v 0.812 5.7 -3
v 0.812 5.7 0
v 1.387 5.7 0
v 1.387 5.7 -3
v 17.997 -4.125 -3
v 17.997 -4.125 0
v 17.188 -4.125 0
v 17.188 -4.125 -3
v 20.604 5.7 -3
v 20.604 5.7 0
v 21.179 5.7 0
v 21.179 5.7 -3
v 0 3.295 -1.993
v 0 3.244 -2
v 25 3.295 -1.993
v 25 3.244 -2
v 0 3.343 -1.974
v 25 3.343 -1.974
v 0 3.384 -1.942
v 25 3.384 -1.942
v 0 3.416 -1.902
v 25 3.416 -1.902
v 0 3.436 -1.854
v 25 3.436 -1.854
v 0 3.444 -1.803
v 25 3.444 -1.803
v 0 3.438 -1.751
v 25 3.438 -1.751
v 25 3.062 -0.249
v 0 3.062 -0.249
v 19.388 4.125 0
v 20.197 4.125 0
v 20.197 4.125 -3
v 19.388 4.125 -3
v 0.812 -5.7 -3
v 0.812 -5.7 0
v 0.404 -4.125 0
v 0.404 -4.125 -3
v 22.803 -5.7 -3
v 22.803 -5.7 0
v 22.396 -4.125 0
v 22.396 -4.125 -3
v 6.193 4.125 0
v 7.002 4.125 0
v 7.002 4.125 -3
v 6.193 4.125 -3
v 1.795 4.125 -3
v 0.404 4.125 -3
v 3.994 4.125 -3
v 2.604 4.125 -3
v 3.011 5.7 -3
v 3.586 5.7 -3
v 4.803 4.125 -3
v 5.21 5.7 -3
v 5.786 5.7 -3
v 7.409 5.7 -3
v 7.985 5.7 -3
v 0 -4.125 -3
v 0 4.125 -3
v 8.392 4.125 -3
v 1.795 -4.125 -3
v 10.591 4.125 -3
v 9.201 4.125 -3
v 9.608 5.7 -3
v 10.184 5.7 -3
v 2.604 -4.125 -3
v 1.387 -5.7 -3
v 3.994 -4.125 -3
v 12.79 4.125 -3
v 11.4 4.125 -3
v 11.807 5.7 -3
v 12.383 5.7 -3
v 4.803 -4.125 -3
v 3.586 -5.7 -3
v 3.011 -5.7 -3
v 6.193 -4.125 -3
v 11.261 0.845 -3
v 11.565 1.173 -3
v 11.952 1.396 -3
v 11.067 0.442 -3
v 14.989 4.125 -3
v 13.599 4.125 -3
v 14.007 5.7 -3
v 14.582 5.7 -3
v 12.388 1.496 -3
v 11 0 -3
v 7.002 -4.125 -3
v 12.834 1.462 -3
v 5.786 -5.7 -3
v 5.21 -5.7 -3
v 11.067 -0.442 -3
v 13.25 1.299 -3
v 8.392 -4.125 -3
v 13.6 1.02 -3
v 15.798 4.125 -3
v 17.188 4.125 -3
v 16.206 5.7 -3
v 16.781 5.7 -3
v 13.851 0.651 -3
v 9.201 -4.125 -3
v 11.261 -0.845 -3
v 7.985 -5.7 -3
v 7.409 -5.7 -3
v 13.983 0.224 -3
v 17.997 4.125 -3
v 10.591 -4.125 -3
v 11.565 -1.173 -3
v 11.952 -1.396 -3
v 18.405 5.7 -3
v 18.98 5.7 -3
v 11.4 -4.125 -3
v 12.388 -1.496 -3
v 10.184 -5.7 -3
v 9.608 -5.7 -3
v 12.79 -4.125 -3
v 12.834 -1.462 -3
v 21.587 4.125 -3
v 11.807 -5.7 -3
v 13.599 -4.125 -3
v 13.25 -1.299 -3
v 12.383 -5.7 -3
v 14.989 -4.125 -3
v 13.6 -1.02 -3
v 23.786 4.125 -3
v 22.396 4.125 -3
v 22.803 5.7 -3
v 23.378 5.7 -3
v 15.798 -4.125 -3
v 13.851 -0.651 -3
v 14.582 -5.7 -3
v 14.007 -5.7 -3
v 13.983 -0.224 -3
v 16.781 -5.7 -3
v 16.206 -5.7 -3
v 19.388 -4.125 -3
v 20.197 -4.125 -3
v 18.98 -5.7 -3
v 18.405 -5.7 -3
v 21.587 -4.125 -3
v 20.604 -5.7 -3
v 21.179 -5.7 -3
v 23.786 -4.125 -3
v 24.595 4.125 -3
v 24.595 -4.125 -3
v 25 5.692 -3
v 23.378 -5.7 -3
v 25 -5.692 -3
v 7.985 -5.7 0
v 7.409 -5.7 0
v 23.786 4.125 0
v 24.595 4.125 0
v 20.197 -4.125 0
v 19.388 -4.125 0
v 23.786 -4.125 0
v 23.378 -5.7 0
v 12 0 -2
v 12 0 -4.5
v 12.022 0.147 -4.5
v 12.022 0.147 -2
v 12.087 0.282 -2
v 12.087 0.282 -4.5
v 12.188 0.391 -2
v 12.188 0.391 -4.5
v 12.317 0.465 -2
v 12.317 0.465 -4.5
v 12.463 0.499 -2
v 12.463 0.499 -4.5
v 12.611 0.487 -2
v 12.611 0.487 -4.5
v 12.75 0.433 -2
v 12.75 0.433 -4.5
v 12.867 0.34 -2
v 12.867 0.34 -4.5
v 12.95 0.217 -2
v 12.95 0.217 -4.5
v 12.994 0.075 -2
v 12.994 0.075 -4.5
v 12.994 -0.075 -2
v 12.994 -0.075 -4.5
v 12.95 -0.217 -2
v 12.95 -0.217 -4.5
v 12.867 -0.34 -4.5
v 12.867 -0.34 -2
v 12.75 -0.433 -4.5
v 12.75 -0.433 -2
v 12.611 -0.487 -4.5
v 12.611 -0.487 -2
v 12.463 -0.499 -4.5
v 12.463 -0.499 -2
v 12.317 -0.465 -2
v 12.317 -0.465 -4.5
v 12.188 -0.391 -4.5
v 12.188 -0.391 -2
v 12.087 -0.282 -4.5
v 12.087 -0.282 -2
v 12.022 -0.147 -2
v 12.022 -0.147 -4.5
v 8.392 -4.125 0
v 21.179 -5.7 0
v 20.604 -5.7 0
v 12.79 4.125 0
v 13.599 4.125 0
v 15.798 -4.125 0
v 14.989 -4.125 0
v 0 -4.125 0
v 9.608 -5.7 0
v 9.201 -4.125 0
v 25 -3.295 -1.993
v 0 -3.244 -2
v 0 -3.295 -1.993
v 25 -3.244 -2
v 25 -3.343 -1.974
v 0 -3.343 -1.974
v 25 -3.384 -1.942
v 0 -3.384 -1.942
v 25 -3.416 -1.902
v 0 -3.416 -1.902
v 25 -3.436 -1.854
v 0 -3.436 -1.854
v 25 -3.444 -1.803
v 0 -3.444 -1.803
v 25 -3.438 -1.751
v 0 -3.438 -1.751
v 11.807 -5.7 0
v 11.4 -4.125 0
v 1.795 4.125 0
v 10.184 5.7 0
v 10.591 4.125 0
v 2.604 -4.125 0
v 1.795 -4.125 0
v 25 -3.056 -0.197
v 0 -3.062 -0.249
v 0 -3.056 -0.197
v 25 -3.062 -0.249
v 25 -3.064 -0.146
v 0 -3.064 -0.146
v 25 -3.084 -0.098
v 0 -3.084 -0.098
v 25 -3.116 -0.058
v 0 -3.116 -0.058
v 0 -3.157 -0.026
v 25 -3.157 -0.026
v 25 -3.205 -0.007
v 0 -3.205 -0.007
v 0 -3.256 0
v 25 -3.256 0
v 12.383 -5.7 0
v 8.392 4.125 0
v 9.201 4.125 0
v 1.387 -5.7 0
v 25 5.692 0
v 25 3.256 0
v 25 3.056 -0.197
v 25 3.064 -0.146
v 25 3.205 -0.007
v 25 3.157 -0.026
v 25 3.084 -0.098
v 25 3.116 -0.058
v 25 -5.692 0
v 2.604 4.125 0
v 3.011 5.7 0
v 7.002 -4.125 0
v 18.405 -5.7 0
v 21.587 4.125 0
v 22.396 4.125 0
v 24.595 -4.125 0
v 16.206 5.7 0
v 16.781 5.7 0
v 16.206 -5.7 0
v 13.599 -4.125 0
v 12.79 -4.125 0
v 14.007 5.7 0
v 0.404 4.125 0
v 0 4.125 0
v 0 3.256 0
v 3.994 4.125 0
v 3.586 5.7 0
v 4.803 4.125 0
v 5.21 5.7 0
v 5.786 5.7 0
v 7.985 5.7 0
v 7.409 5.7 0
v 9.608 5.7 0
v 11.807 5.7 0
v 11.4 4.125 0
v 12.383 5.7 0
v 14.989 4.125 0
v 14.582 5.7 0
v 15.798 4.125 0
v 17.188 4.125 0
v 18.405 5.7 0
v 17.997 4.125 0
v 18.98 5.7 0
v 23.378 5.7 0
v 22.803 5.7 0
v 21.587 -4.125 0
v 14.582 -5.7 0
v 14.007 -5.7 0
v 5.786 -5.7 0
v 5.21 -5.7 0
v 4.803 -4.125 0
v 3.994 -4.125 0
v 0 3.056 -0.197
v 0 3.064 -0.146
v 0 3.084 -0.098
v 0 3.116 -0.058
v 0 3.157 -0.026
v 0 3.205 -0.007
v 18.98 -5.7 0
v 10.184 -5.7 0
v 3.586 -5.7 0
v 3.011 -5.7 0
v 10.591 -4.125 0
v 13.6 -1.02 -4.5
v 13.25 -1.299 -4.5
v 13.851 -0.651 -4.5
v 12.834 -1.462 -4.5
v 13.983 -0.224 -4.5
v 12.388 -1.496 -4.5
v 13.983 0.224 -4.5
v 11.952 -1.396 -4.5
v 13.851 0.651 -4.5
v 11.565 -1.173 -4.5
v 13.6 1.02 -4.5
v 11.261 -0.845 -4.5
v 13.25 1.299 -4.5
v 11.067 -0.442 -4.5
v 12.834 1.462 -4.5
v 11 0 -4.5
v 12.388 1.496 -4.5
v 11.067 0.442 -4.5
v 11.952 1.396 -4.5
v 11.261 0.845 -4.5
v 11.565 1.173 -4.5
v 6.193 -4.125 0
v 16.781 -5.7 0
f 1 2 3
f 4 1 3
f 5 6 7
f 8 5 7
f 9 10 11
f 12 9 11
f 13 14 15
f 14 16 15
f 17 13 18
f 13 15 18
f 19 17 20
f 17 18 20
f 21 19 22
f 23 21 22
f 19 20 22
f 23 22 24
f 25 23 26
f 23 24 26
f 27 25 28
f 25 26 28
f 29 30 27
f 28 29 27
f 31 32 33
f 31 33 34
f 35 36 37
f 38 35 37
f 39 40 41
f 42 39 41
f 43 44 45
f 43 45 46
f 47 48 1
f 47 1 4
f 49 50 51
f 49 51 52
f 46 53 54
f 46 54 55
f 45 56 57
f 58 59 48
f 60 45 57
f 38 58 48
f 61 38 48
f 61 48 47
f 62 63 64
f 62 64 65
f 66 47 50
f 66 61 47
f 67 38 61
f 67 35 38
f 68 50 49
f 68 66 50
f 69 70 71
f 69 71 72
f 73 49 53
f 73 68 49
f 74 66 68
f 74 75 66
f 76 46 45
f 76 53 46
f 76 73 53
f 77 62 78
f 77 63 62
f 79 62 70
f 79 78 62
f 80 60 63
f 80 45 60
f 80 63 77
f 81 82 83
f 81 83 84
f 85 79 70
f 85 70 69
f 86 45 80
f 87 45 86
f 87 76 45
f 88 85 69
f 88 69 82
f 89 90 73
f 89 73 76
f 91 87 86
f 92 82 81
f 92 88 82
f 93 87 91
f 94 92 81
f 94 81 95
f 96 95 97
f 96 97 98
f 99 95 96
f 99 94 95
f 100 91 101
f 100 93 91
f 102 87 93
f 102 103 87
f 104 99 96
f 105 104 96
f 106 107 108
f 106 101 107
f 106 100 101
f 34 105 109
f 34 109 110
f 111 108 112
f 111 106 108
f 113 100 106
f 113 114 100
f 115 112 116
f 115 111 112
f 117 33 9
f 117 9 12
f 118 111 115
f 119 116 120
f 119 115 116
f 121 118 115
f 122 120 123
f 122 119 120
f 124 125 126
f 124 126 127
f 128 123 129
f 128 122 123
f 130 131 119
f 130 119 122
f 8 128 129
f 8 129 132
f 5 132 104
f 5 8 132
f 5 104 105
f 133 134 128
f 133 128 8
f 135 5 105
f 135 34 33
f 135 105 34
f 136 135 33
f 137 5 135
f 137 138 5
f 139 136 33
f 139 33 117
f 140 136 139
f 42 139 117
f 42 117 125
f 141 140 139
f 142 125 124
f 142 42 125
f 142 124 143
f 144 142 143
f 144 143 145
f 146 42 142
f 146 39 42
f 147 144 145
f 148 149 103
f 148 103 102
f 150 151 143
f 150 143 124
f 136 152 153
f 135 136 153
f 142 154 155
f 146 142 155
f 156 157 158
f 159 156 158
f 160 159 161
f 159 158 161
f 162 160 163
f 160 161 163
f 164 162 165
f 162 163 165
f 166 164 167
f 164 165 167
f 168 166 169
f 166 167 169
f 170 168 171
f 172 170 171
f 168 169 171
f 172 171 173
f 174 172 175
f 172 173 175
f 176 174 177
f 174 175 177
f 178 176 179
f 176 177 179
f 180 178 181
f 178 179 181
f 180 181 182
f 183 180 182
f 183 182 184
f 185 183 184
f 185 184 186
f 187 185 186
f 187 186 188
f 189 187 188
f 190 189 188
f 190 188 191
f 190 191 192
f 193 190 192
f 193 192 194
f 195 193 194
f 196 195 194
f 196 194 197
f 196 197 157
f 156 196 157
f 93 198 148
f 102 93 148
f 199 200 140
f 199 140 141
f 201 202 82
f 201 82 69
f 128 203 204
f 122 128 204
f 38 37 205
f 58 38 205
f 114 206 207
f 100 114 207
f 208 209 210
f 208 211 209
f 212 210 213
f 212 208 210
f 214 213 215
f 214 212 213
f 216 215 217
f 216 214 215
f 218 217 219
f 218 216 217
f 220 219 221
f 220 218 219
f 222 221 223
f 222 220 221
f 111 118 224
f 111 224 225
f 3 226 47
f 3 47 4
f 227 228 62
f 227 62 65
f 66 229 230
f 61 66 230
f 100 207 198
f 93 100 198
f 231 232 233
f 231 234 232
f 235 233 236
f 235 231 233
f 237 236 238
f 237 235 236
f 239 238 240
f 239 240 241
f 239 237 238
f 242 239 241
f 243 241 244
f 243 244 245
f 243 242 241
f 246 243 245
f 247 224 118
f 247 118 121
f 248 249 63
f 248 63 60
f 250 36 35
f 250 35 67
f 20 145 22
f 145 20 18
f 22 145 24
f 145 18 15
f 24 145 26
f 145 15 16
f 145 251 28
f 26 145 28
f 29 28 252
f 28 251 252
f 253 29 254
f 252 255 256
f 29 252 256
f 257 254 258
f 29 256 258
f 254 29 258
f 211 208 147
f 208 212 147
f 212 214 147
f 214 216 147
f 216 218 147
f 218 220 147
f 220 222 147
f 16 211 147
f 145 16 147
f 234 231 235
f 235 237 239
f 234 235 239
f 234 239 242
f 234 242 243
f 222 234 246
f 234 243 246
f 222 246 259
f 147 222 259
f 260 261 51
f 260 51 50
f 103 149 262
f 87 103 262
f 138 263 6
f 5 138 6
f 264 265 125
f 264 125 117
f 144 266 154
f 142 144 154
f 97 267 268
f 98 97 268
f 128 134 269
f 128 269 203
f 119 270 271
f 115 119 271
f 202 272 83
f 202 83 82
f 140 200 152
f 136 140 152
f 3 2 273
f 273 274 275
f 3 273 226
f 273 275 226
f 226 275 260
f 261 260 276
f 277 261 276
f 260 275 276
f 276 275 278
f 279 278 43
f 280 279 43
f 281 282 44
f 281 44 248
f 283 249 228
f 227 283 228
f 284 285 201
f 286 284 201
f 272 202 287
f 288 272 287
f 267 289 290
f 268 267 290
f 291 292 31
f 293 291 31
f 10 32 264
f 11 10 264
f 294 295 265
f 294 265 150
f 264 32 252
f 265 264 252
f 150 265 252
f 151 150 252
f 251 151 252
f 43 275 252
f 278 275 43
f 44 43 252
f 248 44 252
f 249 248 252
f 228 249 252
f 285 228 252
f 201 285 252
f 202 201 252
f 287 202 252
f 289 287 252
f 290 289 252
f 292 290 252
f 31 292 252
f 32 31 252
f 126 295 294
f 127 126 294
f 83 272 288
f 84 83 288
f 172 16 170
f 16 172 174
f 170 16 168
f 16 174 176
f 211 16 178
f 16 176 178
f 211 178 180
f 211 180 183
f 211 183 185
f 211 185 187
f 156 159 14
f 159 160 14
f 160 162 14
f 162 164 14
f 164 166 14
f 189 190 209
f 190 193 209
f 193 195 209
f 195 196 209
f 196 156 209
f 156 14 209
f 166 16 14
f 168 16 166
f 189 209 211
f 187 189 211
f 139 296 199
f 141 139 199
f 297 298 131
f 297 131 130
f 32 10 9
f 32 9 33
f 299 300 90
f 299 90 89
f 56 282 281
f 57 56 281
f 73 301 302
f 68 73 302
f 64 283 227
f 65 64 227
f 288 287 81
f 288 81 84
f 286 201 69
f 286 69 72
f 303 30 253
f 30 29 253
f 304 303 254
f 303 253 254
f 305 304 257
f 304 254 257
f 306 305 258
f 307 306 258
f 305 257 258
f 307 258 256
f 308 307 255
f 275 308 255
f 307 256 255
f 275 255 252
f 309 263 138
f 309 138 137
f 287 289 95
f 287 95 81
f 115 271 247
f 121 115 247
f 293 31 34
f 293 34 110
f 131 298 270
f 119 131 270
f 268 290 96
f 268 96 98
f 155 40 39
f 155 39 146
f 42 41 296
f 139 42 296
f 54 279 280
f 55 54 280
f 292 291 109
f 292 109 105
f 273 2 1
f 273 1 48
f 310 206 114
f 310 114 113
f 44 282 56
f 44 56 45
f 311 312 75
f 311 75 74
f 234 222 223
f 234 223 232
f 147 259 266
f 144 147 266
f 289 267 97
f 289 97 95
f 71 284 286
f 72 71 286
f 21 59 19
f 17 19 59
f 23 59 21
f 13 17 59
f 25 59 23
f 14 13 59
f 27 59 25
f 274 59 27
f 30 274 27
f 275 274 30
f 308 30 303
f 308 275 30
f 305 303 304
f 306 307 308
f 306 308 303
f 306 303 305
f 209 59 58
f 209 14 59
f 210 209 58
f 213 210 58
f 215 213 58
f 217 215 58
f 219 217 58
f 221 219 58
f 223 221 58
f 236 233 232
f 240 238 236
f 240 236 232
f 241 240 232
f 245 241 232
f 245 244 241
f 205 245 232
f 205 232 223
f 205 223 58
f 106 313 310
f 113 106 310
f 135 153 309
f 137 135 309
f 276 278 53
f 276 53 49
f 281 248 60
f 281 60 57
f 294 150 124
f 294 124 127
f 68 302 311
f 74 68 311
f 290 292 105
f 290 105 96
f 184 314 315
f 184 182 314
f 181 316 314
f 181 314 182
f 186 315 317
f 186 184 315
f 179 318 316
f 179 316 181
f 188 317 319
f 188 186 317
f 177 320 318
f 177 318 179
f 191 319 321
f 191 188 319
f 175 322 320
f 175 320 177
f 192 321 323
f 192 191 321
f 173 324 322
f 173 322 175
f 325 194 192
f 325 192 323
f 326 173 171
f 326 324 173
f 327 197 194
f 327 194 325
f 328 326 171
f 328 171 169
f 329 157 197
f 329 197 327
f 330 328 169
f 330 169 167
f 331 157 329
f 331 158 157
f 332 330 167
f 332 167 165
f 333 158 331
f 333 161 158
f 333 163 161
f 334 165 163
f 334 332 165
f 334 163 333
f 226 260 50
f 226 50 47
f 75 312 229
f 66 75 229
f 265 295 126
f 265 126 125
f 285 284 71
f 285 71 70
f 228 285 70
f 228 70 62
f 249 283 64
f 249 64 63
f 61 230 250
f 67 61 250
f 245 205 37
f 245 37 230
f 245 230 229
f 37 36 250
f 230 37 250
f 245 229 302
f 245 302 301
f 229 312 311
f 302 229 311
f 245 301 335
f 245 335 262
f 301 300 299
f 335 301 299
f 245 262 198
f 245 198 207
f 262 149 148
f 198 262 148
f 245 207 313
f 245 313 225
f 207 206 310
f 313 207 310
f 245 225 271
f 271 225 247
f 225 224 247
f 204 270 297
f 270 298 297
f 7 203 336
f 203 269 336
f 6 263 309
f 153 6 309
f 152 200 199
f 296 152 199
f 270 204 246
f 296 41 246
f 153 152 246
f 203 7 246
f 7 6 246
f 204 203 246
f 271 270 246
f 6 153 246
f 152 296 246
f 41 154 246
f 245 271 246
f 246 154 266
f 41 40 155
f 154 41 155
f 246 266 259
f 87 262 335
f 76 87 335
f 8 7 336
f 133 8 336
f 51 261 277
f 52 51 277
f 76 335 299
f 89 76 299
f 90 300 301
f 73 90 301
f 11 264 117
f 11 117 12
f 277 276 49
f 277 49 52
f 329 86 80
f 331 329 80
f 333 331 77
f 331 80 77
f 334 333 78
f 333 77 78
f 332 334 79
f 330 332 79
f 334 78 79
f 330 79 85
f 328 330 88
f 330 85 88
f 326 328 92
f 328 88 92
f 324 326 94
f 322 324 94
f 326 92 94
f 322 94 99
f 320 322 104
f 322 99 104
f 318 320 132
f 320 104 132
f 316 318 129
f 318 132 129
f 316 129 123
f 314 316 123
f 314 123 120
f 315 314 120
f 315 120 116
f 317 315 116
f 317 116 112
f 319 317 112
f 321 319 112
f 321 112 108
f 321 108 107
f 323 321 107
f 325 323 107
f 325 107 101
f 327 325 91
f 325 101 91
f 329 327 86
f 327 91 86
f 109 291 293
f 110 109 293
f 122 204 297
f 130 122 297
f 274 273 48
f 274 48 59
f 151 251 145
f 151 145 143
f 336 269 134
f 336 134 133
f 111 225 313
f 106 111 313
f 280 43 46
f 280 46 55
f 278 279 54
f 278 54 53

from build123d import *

# Parameters (mm, degrees)
BLANKSKE_W             = 25
BLANKSKE_H             = 5.7
BLANK_DEPTH            = 3
TOOTHCUTSIM_DEPTH      = 26.816467613
TEETHCUTS_COUNT        = 12
TEETHCUTS_PITCH        = 2.199114855
MIRROR_2_COPY_1_DEPTH  = 26.816467613
MIRROR_2_COPY_2_DEPTH  = 26.816467613
MIRROR_2_COPY_3_DEPTH  = 26.816467613
MIRROR_2_COPY_4_DEPTH  = 26.816467613
MIRROR_2_COPY_5_DEPTH  = 26.816467613
MIRROR_2_COPY_6_DEPTH  = 26.816467613
MIRROR_2_COPY_7_DEPTH  = 26.816467613
MIRROR_2_COPY_8_DEPTH  = 26.816467613
MIRROR_2_COPY_9_DEPTH  = 26.816467613
MIRROR_2_COPY_10_DEPTH = 26.816467613
MIRROR_2_COPY_11_DEPTH = 26.816467613
CUT_EXTRUDE_2_DEPTH    = 26.816467613
FILLET_1_R             = 0.2
FILLET_2_R             = 0.2
FILLET_3_R             = 0.2
SKETCH_2_R             = 1.5
EXTRUDE_1_DEPTH        = 1.5
SKETCH_3_R             = 0.5
CUT_EXTRUDE_3_DEPTH    = 27.033440034


with BuildPart() as part:
    # BlankSke → Blank (new body)
    with BuildSketch(Plane.XY):
        with Locations((12.5, 2.85)):
            Rectangle(BLANKSKE_W, BLANKSKE_H)
    blank = extrude(amount=-BLANK_DEPTH)

    # TooCutSkeSim → ToothCutSim (cut, through all)
    with BuildSketch(Plane.XY):
        Polygon((0.404488327, 4.125), (-0.404488327, 4.125), (-0.818379909, 5.7254), (0.818379909, 5.7254), align=None)
    toothcutsim = extrude(amount=-TOOTHCUTSIM_DEPTH, mode=Mode.SUBTRACT)

    # TeethCuts: ToothCutSim ×12
    with Locations(*[(i * TEETHCUTS_PITCH, 0, 0) for i in range(1, TEETHCUTS_COUNT)]):
        add(toothcutsim, mode=Mode.SUBTRACT)

    # 镜向2: Blank, ToothCutSim across plane
    add(blank.mirror(Plane(origin=(0, 0, -3), x_dir=(0, 0, 1), z_dir=(0, -1, 0))))
    add(toothcutsim.mirror(Plane(origin=(0, 0, -3), x_dir=(0, 0, 1), z_dir=(0, -1, 0))), mode=Mode.SUBTRACT)

    # 镜向2 copy 1 sketch → 镜向2 copy 1 (cut, through all)
    with BuildSketch(Plane(origin=(2.199114855, 0, 0), x_dir=(1, 0, 0), z_dir=(0, 0, 1))):
        Polygon((0.404488327, -4.125), (-0.404488327, -4.125), (-0.818379909, -5.7254), (0.818379909, -5.7254), align=None)
    extrude(amount=-MIRROR_2_COPY_1_DEPTH, mode=Mode.SUBTRACT)

    # 镜向2 copy 2 sketch → 镜向2 copy 2 (cut, through all)
    with BuildSketch(Plane(origin=(4.39822971, 0, 0), x_dir=(1, 0, 0), z_dir=(0, 0, 1))):
        Polygon((0.404488327, -4.125), (-0.404488327, -4.125), (-0.818379909, -5.7254), (0.818379909, -5.7254), align=None)
    extrude(amount=-MIRROR_2_COPY_2_DEPTH, mode=Mode.SUBTRACT)

    # 镜向2 copy 3 sketch → 镜向2 copy 3 (cut, through all)
    with BuildSketch(Plane(origin=(6.597344565, 0, 0), x_dir=(1, 0, 0), z_dir=(0, 0, 1))):
        Polygon((0.404488327, -4.125), (-0.404488327, -4.125), (-0.818379909, -5.7254), (0.818379909, -5.7254), align=None)
    extrude(amount=-MIRROR_2_COPY_3_DEPTH, mode=Mode.SUBTRACT)

    # 镜向2 copy 4 sketch → 镜向2 copy 4 (cut, through all)
    with BuildSketch(Plane(origin=(8.79645942, 0, 0), x_dir=(1, 0, 0), z_dir=(0, 0, 1))):
        Polygon((0.404488327, -4.125), (-0.404488327, -4.125), (-0.818379909, -5.7254), (0.818379909, -5.7254), align=None)
    extrude(amount=-MIRROR_2_COPY_4_DEPTH, mode=Mode.SUBTRACT)

    # 镜向2 copy 5 sketch → 镜向2 copy 5 (cut, through all)
    with BuildSketch(Plane(origin=(10.995574275, 0, 0), x_dir=(1, 0, 0), z_dir=(0, 0, 1))):
        Polygon((0.404488327, -4.125), (-0.404488327, -4.125), (-0.818379909, -5.7254), (0.818379909, -5.7254), align=None)
    extrude(amount=-MIRROR_2_COPY_5_DEPTH, mode=Mode.SUBTRACT)

    # 镜向2 copy 6 sketch → 镜向2 copy 6 (cut, through all)
    with BuildSketch(Plane(origin=(13.19468913, 0, 0), x_dir=(1, 0, 0), z_dir=(0, 0, 1))):
        Polygon((0.404488327, -4.125), (-0.404488327, -4.125), (-0.818379909, -5.7254), (0.818379909, -5.7254), align=None)
    extrude(amount=-MIRROR_2_COPY_6_DEPTH, mode=Mode.SUBTRACT)

    # 镜向2 copy 7 sketch → 镜向2 copy 7 (cut, through all)
    with BuildSketch(Plane(origin=(15.393803985, 0, 0), x_dir=(1, 0, 0), z_dir=(0, 0, 1))):
        Polygon((0.404488327, -4.125), (-0.404488327, -4.125), (-0.818379909, -5.7254), (0.818379909, -5.7254), align=None)
    extrude(amount=-MIRROR_2_COPY_7_DEPTH, mode=Mode.SUBTRACT)

    # 镜向2 copy 8 sketch → 镜向2 copy 8 (cut, through all)
    with BuildSketch(Plane(origin=(17.59291884, 0, 0), x_dir=(1, 0, 0), z_dir=(0, 0, 1))):
        Polygon((0.404488327, -4.125), (-0.404488327, -4.125), (-0.818379909, -5.7254), (0.818379909, -5.7254), align=None)
    extrude(amount=-MIRROR_2_COPY_8_DEPTH, mode=Mode.SUBTRACT)

    # 镜向2 copy 9 sketch → 镜向2 copy 9 (cut, through all)
    with BuildSketch(Plane(origin=(19.792033695, 0, 0), x_dir=(1, 0, 0), z_dir=(0, 0, 1))):
        Polygon((0.404488327, -4.125), (-0.404488327, -4.125), (-0.818379909, -5.7254), (0.818379909, -5.7254), align=None)
    extrude(amount=-MIRROR_2_COPY_9_DEPTH, mode=Mode.SUBTRACT)

    # 镜向2 copy 10 sketch → 镜向2 copy 10 (cut, through all)
    with BuildSketch(Plane(origin=(21.99114855, 0, 0), x_dir=(1, 0, 0), z_dir=(0, 0, 1))):
        Polygon((0.404488327, -4.125), (-0.404488327, -4.125), (-0.818379909, -5.7254), (0.818379909, -5.7254), align=None)
    extrude(amount=-MIRROR_2_COPY_10_DEPTH, mode=Mode.SUBTRACT)

    # 镜向2 copy 11 sketch → 镜向2 copy 11 (cut, through all)
    with BuildSketch(Plane(origin=(24.190263405, 0, 0), x_dir=(1, 0, 0), z_dir=(0, 0, 1))):
        Polygon((0.404488327, -4.125), (-0.404488327, -4.125), (-0.818379909, -5.7254), (0.818379909, -5.7254), align=None)
    extrude(amount=-MIRROR_2_COPY_11_DEPTH, mode=Mode.SUBTRACT)

    # 草图1 → 切除-拉伸2 (cut, through all)
    with BuildSketch(Plane.ZY):
        Polygon((0, -3), (0, 3), (-2, 3.5), (-2, -3.5), align=None)
    extrude(amount=-CUT_EXTRUDE_2_DEPTH, mode=Mode.SUBTRACT)

    # 圆角1
    fillet_1_edges = [part.edges().sort_by_distance(p)[0] for p in [
        (12.5, -3.5, -2),
    ]]
    fillet(fillet_1_edges, radius=FILLET_1_R)

    # 圆角2
    fillet_2_edges = [part.edges().sort_by_distance(p)[0] for p in [
        (12.5, 3.5, -2),
    ]]
    fillet(fillet_2_edges, radius=FILLET_2_R)

    # 圆角3
    fillet_3_edges = [part.edges().sort_by_distance(p)[0] for p in [
        (12.5, -3, 0),
        (12.5, 3, 0),
    ]]
    fillet(fillet_3_edges, radius=FILLET_3_R)

    # 草图2 → 凸台-拉伸1 (add)
    with BuildSketch(Plane(origin=(0, 0, -3), x_dir=(-1, 0, 0), z_dir=(0, 0, -1))):
        with Locations((-12.5, 0)):
            Circle(SKETCH_2_R)
    extrude(amount=EXTRUDE_1_DEPTH)

    # 草图3 → 切除-拉伸3 (cut, through all)
    with BuildSketch(Plane(origin=(0, 0, -4.5), x_dir=(-1, 0, 0), z_dir=(0, 0, -1))):
        with Locations((-12.5, 0)):
            Circle(SKETCH_3_R)
    extrude(amount=-CUT_EXTRUDE_3_DEPTH, mode=Mode.SUBTRACT)


solid = part.part
